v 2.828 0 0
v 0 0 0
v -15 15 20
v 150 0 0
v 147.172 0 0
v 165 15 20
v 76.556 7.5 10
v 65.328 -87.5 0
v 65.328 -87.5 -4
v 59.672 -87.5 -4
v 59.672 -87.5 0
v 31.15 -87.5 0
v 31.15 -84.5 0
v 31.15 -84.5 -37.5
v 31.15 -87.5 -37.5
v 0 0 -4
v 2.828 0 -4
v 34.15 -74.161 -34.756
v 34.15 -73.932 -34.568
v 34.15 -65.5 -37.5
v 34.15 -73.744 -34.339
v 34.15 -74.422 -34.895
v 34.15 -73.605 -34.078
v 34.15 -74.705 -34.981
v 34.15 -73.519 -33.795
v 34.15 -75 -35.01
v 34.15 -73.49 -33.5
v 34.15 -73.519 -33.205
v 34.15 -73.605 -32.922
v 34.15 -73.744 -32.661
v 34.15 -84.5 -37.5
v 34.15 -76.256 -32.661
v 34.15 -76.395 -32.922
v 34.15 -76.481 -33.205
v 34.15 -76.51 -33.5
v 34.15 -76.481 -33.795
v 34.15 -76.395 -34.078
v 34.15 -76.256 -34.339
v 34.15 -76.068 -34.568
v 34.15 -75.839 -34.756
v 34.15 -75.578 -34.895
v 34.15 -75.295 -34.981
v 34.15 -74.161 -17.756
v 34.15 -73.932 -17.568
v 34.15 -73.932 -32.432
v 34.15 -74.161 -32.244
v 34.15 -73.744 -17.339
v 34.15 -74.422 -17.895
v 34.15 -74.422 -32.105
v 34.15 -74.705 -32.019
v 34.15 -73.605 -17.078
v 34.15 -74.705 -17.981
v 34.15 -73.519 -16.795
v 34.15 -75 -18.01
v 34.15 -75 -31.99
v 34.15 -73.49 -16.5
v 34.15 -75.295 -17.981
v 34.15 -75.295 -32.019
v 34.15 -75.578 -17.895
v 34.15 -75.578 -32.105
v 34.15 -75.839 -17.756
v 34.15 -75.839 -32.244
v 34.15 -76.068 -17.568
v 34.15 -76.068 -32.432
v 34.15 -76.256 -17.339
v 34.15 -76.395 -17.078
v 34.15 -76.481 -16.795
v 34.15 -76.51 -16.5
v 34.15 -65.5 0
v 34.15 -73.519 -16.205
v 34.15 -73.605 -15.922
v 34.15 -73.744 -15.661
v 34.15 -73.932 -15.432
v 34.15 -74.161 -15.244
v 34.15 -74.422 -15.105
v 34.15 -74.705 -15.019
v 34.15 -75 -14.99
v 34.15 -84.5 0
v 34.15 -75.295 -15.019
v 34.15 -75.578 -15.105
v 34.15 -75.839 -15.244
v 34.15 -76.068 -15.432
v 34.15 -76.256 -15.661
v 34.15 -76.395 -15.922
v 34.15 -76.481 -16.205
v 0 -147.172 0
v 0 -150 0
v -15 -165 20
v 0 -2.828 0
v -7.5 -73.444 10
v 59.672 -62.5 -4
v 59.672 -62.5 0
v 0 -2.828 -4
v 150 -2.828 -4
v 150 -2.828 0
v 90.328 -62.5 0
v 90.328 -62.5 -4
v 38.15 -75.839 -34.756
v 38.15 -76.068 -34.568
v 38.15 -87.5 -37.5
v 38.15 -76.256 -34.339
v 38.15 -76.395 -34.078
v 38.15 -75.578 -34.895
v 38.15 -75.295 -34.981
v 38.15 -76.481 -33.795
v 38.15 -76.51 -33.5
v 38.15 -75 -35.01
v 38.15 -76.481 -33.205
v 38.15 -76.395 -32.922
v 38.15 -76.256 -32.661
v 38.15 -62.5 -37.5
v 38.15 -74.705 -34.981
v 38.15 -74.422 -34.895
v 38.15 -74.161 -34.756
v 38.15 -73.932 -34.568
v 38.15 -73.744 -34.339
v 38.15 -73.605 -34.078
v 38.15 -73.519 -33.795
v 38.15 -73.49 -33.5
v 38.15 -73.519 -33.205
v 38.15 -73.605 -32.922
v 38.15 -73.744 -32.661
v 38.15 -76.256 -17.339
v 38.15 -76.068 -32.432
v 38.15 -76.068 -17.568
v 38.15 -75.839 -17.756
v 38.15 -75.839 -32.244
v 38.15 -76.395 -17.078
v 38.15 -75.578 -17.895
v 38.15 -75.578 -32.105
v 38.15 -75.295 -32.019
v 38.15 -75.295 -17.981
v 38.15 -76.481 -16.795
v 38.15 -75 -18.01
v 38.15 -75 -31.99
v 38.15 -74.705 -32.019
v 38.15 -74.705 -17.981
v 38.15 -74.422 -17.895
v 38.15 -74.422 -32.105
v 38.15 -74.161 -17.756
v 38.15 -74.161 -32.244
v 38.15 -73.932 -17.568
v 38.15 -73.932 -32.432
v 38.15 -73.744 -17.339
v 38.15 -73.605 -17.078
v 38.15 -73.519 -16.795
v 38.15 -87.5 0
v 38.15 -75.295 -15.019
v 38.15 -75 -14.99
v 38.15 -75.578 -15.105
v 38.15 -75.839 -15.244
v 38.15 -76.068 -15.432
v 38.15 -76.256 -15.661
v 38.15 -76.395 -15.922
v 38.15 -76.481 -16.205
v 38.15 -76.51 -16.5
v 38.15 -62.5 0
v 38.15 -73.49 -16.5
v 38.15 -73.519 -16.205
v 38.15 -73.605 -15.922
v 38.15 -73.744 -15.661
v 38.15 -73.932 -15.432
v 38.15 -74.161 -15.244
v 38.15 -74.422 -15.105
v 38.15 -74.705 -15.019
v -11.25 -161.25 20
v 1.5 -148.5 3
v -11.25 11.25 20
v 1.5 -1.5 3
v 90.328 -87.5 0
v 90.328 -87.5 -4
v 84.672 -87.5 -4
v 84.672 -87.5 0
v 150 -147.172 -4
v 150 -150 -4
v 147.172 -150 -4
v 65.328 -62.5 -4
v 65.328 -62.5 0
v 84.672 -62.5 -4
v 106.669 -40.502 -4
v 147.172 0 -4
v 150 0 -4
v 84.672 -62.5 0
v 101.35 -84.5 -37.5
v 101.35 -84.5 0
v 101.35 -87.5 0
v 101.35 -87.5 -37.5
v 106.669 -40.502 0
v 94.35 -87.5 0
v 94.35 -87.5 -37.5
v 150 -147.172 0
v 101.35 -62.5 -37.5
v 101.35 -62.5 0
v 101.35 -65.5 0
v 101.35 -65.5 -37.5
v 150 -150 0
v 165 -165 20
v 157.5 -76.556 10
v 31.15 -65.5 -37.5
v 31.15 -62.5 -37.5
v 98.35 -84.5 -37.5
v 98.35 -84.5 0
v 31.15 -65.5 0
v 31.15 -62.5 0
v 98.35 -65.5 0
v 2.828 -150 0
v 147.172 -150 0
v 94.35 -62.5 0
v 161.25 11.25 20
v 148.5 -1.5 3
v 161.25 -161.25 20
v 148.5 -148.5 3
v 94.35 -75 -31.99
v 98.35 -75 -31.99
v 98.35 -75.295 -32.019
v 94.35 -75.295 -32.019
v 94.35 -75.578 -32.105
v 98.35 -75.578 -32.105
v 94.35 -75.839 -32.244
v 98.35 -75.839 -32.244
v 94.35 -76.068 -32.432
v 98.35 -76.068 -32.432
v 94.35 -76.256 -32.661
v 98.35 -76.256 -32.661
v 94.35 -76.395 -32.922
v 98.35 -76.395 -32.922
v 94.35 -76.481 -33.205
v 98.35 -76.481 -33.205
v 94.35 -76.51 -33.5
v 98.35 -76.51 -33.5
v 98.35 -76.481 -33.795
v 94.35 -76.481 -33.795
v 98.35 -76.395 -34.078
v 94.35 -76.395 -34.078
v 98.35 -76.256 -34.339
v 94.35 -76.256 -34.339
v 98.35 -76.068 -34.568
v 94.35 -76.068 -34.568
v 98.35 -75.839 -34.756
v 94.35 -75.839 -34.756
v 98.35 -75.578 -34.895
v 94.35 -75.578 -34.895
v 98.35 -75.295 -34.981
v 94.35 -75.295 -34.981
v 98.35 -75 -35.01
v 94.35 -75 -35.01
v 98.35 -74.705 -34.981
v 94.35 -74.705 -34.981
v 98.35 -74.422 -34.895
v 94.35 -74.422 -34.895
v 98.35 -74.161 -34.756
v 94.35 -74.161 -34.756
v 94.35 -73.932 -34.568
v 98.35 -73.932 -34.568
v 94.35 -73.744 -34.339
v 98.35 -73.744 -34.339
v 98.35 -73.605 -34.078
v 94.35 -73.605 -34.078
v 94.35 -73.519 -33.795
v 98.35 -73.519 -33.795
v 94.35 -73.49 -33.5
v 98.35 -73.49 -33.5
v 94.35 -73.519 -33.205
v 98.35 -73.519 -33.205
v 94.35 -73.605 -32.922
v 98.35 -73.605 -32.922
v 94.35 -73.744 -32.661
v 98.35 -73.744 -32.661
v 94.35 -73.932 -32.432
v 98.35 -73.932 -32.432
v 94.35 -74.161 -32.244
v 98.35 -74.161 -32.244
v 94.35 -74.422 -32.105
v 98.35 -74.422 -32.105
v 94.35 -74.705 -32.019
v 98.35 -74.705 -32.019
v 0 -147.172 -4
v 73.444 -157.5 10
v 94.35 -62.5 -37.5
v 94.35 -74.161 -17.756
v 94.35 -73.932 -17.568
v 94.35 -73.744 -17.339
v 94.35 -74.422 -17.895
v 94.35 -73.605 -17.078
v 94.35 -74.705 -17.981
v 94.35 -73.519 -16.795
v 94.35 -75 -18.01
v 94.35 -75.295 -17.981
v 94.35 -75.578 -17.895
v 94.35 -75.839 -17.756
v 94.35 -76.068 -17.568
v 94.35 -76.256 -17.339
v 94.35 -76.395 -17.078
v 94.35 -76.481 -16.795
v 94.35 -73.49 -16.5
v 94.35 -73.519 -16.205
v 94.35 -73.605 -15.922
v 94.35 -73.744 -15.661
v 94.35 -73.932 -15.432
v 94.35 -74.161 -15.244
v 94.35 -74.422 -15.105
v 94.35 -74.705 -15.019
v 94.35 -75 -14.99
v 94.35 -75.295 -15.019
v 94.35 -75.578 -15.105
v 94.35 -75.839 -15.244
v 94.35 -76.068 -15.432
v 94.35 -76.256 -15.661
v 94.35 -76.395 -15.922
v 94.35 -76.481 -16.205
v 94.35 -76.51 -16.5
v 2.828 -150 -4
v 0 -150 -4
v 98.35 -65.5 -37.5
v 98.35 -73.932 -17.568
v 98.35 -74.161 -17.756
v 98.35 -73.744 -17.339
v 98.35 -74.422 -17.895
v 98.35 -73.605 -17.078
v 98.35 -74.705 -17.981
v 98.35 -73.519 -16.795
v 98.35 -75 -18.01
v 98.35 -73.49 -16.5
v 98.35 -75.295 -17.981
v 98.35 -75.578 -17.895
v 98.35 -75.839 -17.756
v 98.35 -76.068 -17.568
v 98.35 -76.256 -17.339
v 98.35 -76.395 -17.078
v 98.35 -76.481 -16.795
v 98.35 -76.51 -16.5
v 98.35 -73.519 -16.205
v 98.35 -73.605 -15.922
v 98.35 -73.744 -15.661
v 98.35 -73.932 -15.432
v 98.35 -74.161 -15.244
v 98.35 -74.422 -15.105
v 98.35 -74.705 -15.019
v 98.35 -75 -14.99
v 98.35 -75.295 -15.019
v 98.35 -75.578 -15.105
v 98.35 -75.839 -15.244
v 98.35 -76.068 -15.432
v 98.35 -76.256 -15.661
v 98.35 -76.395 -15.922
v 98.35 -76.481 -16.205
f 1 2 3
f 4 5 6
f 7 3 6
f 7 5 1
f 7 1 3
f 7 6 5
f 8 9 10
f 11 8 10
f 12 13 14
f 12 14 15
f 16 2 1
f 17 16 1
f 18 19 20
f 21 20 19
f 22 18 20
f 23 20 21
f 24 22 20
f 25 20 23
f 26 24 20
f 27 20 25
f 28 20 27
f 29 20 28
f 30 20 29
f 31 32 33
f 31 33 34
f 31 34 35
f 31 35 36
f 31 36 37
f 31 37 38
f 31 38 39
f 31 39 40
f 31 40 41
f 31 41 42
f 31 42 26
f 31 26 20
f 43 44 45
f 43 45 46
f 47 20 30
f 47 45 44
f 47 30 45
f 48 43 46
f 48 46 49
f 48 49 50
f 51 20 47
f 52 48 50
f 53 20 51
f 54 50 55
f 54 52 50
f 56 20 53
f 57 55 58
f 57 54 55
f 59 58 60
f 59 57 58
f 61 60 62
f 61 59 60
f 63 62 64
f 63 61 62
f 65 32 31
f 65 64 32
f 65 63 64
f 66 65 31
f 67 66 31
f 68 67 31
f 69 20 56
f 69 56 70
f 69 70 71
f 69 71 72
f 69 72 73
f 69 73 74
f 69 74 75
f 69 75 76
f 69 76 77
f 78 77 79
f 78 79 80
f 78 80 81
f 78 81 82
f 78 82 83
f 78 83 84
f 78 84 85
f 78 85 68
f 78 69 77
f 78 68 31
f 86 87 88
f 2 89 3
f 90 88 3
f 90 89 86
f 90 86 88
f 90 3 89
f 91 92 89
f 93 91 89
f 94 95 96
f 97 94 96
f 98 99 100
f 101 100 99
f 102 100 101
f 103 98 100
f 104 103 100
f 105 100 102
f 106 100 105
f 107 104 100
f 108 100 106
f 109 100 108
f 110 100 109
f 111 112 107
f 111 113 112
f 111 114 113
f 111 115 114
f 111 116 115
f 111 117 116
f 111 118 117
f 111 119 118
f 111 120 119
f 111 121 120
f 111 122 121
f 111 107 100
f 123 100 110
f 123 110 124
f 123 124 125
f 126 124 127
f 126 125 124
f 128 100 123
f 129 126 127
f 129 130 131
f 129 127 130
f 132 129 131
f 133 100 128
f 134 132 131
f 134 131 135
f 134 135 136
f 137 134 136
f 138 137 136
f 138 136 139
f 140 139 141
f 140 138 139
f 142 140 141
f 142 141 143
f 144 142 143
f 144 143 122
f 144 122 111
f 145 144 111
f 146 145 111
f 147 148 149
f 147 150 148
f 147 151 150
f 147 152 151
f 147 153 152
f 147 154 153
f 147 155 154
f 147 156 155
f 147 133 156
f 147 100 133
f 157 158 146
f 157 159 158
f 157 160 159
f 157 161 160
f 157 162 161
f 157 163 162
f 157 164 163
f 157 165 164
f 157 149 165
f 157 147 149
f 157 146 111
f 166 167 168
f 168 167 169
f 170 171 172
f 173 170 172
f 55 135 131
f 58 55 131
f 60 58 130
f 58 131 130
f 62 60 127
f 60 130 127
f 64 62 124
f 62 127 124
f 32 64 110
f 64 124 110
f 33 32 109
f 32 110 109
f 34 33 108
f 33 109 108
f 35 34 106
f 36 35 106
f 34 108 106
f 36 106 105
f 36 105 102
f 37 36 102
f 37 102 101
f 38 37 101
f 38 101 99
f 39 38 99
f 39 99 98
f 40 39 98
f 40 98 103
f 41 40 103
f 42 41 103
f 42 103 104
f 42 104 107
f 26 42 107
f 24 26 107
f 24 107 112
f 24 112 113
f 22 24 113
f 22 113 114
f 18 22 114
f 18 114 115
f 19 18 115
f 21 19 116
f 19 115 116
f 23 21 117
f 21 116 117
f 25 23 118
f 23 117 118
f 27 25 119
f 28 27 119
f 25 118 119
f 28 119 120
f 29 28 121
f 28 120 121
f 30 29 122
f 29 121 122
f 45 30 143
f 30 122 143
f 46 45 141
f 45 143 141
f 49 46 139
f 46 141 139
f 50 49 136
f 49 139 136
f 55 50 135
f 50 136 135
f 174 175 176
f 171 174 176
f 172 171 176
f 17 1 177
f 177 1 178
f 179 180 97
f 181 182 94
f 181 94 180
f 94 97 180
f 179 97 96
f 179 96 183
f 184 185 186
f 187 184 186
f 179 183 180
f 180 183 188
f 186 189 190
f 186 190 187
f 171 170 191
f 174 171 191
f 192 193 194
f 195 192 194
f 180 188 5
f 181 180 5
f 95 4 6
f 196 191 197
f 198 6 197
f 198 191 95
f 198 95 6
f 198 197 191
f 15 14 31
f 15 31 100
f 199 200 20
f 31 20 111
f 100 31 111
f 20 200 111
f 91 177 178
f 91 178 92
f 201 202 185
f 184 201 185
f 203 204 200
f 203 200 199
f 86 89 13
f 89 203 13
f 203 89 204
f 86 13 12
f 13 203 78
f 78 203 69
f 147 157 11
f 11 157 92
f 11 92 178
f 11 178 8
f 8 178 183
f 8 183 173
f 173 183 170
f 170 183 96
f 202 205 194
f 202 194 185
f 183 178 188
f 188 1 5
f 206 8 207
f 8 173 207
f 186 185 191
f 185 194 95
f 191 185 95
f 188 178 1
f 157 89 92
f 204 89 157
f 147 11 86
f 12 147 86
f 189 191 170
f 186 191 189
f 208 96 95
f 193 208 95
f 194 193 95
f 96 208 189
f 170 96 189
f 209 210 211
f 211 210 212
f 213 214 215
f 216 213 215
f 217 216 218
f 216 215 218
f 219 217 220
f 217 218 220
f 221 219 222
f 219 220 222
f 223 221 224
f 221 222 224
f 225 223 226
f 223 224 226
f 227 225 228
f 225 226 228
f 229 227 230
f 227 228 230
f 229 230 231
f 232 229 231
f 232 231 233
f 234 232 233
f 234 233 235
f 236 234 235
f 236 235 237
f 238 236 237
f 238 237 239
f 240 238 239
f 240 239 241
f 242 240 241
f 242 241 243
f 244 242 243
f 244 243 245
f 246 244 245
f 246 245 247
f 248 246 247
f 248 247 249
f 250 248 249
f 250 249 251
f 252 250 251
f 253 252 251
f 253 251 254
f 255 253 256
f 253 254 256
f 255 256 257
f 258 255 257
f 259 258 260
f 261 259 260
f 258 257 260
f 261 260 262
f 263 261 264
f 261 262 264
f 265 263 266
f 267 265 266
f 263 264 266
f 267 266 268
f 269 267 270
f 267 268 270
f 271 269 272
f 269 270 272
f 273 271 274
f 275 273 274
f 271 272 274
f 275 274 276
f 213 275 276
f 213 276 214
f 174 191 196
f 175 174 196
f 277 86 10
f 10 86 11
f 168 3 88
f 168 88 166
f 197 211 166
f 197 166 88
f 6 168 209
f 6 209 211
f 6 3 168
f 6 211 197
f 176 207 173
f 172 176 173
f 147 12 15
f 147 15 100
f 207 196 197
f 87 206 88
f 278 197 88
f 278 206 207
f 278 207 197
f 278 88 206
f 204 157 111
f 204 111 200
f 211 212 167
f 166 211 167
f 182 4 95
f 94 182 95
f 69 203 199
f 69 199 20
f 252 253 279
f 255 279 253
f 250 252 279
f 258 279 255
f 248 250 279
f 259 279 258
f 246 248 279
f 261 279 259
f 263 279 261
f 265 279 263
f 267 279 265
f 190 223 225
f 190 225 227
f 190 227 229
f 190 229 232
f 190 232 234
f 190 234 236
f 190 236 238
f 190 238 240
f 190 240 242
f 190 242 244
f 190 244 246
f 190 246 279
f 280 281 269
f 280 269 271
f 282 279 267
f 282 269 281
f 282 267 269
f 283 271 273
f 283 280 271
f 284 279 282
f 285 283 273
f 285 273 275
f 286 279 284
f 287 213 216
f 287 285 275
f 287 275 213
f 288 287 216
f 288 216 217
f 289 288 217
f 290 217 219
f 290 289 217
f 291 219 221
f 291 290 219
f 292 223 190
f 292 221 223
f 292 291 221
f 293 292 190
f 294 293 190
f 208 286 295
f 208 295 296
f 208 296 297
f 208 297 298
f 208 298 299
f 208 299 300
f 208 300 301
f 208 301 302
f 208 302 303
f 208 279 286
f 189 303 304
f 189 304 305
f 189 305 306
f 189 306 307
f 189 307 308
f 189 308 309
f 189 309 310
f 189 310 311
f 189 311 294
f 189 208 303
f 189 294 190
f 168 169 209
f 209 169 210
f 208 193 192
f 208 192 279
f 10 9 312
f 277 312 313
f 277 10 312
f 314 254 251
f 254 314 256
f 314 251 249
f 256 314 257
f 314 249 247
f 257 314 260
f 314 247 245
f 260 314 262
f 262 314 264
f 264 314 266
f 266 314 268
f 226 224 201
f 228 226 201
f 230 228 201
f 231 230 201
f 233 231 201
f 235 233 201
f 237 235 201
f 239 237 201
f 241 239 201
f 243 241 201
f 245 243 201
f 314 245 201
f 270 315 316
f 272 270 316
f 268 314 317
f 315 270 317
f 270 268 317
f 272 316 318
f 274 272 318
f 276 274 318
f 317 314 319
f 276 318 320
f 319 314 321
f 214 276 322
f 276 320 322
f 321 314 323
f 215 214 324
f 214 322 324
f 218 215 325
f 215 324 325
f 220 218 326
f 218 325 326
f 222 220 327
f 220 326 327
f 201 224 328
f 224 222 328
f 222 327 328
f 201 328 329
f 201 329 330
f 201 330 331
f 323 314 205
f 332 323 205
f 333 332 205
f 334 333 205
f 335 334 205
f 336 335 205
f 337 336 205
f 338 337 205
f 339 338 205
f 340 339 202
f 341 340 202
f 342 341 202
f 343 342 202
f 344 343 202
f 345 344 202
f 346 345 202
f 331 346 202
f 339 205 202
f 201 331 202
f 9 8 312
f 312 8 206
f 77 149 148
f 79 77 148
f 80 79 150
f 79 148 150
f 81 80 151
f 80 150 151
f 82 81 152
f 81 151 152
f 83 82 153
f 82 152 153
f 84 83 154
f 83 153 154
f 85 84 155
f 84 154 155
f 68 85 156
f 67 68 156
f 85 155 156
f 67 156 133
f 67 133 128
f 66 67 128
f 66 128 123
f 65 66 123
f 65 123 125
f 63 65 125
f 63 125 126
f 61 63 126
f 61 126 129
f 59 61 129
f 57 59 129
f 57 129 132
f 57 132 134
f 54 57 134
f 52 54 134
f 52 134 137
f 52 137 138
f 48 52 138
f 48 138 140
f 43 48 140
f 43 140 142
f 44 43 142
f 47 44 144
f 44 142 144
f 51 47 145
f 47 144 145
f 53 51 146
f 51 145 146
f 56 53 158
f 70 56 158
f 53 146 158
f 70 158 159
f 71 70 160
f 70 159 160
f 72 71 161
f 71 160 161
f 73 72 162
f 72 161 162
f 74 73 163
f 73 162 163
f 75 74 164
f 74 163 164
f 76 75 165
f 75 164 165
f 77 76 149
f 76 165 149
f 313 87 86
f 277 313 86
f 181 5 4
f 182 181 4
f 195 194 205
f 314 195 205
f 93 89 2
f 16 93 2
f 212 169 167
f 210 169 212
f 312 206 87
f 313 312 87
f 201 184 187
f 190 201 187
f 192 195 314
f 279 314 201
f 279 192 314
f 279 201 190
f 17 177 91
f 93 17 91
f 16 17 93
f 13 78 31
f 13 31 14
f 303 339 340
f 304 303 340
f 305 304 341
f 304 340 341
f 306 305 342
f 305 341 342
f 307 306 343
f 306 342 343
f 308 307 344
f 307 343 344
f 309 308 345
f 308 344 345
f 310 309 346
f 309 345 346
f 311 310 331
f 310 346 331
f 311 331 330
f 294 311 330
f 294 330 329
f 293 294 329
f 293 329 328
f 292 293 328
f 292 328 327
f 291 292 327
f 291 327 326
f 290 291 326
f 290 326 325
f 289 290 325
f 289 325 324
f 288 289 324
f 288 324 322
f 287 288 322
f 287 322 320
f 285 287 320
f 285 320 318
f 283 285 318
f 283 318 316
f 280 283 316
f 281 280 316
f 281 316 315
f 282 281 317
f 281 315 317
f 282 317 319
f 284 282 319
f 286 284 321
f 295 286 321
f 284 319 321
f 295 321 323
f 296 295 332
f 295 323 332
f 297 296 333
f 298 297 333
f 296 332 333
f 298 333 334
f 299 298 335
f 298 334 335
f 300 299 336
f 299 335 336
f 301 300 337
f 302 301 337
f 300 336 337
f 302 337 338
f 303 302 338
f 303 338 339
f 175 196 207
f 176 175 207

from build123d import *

# Parameters (mm, degrees)
SHELL_2_T           = -3
SKETCH_4_R          = 1.5
CUT_EXTRUDE_1_DEPTH = 10
EXTRUDE_1_DEPTH     = 40.5
CUT_EXTRUDE_2_DEPTH = 100
SKETCH_8_R          = 1.5
EXTRUDE_2_DEPTH     = 3
EXTRUDE_3_DEPTH     = 4
EXTRUDE_4_DEPTH     = 4
SKETCH_11_W         = 56.2
SKETCH_11_H         = 25
CUT_EXTRUDE_3_DEPTH = 4


with BuildPart() as part:
    # 草图3 → 放样1 section 0
    with BuildSketch(Plane.XY.offset(20)):
        with BuildLine():
            Line((-15, 15), (165, 15))
            Line((165, 15), (165, -165))
            Line((165, -165), (-15, -165))
            Line((-15, -165), (-15, 15))
        make_face()
    # 草图1 → 放样1 section 1
    with BuildSketch(Plane.XY):
        with BuildLine():
            Line((0, 0), (150, 0))
            Line((150, 0), (150, -150))
            Line((150, -150), (0, -150))
            Line((0, -150), (0, 0))
        make_face()
    loft()

    # 抽壳2
    shell_2_openings = [part.faces().sort_by_distance(p)[0] for p in [
        (75, -75, 20),
    ]]
    offset(amount=SHELL_2_T, openings=shell_2_openings, kind=Kind.INTERSECTION)

    # 草图4 → 切除-拉伸1 (cut)
    with BuildSketch(Plane.XY.offset(3)):
        with BuildLine():
            ThreePointArc((86.25, -75), (84.75, -73.5), (83.25, -75))
            Line((83.25, -75), (86.25, -75))
        make_face()
        with BuildLine():
            Line((86.25, -75), (83.25, -75))
            ThreePointArc((83.25, -75), (84.75, -76.5), (86.25, -75))
        make_face()
        with Locations((66.25, -82)):
            Circle(SKETCH_4_R)
        with BuildLine():
            ThreePointArc((74.75, -75), (73.25, -73.5), (71.75, -75))
            Line((71.75, -75), (74.75, -75))
        make_face()
        with BuildLine():
            Line((74.75, -75), (71.75, -75))
            ThreePointArc((71.75, -75), (73.25, -76.5), (74.75, -75))
        make_face()
        with Locations((66.25, -68)):
            Circle(SKETCH_4_R)
        with BuildLine():
            ThreePointArc((60.75, -75), (59.25, -73.5), (57.75, -75))
            Line((57.75, -75), (60.75, -75))
        make_face()
        with BuildLine():
            Line((60.75, -75), (57.75, -75))
            ThreePointArc((57.75, -75), (59.25, -76.5), (60.75, -75))
        make_face()
        with BuildLine():
            ThreePointArc((49.25, -75), (47.75, -73.5), (46.25, -75))
            Line((46.25, -75), (49.25, -75))
        make_face()
        with BuildLine():
            Line((49.25, -75), (46.25, -75))
            ThreePointArc((46.25, -75), (47.75, -76.5), (49.25, -75))
        make_face()
    extrude(amount=-CUT_EXTRUDE_1_DEPTH, mode=Mode.SUBTRACT)

    # 草图6 → 凸台-拉伸1 (add)
    with BuildSketch(Plane.XY.offset(3)):
        Polygon((38.15, -62.5), (34.15, -62.5), (31.15, -62.5), (31.15, -65.5), (34.15, -65.5), (34.15, -84.5), (31.15, -84.5), (31.15, -87.5), (34.15, -87.5), (38.15, -87.5), (38.15, -75), align=None)
        Polygon((94.35, -75), (94.35, -62.5), (98.35, -62.5), (101.35, -62.5), (101.35, -65.5), (98.35, -65.5), (98.35, -84.5), (101.35, -84.5), (101.35, -87.5), (98.35, -87.5), (94.35, -87.5), align=None)
    extrude(amount=-EXTRUDE_1_DEPTH)

    # 草图7 → 切除-拉伸2 (cut)
    with BuildSketch(Plane(origin=(98.35, 0, 0), x_dir=(0, 0, -1), z_dir=(1, 0, 0))):
        with BuildLine():
            ThreePointArc((18.01, -75), (16.5, -73.49), (14.99, -75))
            Line((14.99, -75), (16.5, -75))
            Line((16.5, -75), (18.01, -75))
        make_face()
        with BuildLine():
            Line((16.5, -75), (14.99, -75))
            ThreePointArc((14.99, -75), (16.5, -76.51), (18.01, -75))
            Line((18.01, -75), (16.5, -75))
        make_face()
        with BuildLine():
            ThreePointArc((35.01, -75), (33.5, -73.49), (31.99, -75))
            Line((31.99, -75), (33.5, -75))
            Line((33.5, -75), (35.01, -75))
        make_face()
        with BuildLine():
            Line((33.5, -75), (31.99, -75))
            ThreePointArc((31.99, -75), (33.5, -76.51), (35.01, -75))
            Line((35.01, -75), (33.5, -75))
        make_face()
    extrude(amount=-CUT_EXTRUDE_2_DEPTH, mode=Mode.SUBTRACT)

    # 草图8 → 凸台-拉伸2 (add)
    with BuildSketch(Plane.XY.offset(3)):
        with Locations((66.25, -68)):
            Circle(SKETCH_8_R)
        with Locations((59.25, -75)):
            Circle(SKETCH_8_R)
        with Locations((47.75, -75)):
            Circle(SKETCH_8_R)
        with Locations((73.25, -75)):
            Circle(SKETCH_8_R)
        with Locations((84.75, -75)):
            Circle(SKETCH_8_R)
        with Locations((66.25, -82)):
            Circle(SKETCH_8_R)
    extrude(amount=-EXTRUDE_2_DEPTH)

    # 草图9 → 凸台-拉伸3 (add)
    with BuildSketch(Plane(origin=(0, 0, 0), x_dir=(-1, 0, 0), z_dir=(0, 0, -1))):
        Polygon((-73.585786438, -76.414213562), (0, -2.828427125), (0, 0), (-2.828427125, 0), (-72.748638048, -69.920210924), (-150, -147.171572875), (-150, -150), (-147.171572875, -150), align=None)
    extrude(amount=EXTRUDE_3_DEPTH)

    # 草图10 → 凸台-拉伸4 (add)
    with BuildSketch(Plane(origin=(0, 0, 0), x_dir=(-1, 0, 0), z_dir=(0, 0, -1))):
        Polygon((-106.669297814, -40.502275062), (-147.171572875, 0), (-150, 0), (-150, -2.828427125), (-121.973814525, -30.8546126), (-2.828427125, -150), (0, -150), (0, -147.171572875), align=None)
    extrude(amount=EXTRUDE_4_DEPTH)

    # 草图11 → 切除-拉伸3 (cut)
    with BuildSketch(Plane(origin=(0, 0, -4), x_dir=(-1, 0, 0), z_dir=(0, 0, -1))):
        with Locations((-66.25, -75)):
            Rectangle(SKETCH_11_W, SKETCH_11_H)
    extrude(amount=-CUT_EXTRUDE_3_DEPTH, mode=Mode.SUBTRACT)


solid = part.part
